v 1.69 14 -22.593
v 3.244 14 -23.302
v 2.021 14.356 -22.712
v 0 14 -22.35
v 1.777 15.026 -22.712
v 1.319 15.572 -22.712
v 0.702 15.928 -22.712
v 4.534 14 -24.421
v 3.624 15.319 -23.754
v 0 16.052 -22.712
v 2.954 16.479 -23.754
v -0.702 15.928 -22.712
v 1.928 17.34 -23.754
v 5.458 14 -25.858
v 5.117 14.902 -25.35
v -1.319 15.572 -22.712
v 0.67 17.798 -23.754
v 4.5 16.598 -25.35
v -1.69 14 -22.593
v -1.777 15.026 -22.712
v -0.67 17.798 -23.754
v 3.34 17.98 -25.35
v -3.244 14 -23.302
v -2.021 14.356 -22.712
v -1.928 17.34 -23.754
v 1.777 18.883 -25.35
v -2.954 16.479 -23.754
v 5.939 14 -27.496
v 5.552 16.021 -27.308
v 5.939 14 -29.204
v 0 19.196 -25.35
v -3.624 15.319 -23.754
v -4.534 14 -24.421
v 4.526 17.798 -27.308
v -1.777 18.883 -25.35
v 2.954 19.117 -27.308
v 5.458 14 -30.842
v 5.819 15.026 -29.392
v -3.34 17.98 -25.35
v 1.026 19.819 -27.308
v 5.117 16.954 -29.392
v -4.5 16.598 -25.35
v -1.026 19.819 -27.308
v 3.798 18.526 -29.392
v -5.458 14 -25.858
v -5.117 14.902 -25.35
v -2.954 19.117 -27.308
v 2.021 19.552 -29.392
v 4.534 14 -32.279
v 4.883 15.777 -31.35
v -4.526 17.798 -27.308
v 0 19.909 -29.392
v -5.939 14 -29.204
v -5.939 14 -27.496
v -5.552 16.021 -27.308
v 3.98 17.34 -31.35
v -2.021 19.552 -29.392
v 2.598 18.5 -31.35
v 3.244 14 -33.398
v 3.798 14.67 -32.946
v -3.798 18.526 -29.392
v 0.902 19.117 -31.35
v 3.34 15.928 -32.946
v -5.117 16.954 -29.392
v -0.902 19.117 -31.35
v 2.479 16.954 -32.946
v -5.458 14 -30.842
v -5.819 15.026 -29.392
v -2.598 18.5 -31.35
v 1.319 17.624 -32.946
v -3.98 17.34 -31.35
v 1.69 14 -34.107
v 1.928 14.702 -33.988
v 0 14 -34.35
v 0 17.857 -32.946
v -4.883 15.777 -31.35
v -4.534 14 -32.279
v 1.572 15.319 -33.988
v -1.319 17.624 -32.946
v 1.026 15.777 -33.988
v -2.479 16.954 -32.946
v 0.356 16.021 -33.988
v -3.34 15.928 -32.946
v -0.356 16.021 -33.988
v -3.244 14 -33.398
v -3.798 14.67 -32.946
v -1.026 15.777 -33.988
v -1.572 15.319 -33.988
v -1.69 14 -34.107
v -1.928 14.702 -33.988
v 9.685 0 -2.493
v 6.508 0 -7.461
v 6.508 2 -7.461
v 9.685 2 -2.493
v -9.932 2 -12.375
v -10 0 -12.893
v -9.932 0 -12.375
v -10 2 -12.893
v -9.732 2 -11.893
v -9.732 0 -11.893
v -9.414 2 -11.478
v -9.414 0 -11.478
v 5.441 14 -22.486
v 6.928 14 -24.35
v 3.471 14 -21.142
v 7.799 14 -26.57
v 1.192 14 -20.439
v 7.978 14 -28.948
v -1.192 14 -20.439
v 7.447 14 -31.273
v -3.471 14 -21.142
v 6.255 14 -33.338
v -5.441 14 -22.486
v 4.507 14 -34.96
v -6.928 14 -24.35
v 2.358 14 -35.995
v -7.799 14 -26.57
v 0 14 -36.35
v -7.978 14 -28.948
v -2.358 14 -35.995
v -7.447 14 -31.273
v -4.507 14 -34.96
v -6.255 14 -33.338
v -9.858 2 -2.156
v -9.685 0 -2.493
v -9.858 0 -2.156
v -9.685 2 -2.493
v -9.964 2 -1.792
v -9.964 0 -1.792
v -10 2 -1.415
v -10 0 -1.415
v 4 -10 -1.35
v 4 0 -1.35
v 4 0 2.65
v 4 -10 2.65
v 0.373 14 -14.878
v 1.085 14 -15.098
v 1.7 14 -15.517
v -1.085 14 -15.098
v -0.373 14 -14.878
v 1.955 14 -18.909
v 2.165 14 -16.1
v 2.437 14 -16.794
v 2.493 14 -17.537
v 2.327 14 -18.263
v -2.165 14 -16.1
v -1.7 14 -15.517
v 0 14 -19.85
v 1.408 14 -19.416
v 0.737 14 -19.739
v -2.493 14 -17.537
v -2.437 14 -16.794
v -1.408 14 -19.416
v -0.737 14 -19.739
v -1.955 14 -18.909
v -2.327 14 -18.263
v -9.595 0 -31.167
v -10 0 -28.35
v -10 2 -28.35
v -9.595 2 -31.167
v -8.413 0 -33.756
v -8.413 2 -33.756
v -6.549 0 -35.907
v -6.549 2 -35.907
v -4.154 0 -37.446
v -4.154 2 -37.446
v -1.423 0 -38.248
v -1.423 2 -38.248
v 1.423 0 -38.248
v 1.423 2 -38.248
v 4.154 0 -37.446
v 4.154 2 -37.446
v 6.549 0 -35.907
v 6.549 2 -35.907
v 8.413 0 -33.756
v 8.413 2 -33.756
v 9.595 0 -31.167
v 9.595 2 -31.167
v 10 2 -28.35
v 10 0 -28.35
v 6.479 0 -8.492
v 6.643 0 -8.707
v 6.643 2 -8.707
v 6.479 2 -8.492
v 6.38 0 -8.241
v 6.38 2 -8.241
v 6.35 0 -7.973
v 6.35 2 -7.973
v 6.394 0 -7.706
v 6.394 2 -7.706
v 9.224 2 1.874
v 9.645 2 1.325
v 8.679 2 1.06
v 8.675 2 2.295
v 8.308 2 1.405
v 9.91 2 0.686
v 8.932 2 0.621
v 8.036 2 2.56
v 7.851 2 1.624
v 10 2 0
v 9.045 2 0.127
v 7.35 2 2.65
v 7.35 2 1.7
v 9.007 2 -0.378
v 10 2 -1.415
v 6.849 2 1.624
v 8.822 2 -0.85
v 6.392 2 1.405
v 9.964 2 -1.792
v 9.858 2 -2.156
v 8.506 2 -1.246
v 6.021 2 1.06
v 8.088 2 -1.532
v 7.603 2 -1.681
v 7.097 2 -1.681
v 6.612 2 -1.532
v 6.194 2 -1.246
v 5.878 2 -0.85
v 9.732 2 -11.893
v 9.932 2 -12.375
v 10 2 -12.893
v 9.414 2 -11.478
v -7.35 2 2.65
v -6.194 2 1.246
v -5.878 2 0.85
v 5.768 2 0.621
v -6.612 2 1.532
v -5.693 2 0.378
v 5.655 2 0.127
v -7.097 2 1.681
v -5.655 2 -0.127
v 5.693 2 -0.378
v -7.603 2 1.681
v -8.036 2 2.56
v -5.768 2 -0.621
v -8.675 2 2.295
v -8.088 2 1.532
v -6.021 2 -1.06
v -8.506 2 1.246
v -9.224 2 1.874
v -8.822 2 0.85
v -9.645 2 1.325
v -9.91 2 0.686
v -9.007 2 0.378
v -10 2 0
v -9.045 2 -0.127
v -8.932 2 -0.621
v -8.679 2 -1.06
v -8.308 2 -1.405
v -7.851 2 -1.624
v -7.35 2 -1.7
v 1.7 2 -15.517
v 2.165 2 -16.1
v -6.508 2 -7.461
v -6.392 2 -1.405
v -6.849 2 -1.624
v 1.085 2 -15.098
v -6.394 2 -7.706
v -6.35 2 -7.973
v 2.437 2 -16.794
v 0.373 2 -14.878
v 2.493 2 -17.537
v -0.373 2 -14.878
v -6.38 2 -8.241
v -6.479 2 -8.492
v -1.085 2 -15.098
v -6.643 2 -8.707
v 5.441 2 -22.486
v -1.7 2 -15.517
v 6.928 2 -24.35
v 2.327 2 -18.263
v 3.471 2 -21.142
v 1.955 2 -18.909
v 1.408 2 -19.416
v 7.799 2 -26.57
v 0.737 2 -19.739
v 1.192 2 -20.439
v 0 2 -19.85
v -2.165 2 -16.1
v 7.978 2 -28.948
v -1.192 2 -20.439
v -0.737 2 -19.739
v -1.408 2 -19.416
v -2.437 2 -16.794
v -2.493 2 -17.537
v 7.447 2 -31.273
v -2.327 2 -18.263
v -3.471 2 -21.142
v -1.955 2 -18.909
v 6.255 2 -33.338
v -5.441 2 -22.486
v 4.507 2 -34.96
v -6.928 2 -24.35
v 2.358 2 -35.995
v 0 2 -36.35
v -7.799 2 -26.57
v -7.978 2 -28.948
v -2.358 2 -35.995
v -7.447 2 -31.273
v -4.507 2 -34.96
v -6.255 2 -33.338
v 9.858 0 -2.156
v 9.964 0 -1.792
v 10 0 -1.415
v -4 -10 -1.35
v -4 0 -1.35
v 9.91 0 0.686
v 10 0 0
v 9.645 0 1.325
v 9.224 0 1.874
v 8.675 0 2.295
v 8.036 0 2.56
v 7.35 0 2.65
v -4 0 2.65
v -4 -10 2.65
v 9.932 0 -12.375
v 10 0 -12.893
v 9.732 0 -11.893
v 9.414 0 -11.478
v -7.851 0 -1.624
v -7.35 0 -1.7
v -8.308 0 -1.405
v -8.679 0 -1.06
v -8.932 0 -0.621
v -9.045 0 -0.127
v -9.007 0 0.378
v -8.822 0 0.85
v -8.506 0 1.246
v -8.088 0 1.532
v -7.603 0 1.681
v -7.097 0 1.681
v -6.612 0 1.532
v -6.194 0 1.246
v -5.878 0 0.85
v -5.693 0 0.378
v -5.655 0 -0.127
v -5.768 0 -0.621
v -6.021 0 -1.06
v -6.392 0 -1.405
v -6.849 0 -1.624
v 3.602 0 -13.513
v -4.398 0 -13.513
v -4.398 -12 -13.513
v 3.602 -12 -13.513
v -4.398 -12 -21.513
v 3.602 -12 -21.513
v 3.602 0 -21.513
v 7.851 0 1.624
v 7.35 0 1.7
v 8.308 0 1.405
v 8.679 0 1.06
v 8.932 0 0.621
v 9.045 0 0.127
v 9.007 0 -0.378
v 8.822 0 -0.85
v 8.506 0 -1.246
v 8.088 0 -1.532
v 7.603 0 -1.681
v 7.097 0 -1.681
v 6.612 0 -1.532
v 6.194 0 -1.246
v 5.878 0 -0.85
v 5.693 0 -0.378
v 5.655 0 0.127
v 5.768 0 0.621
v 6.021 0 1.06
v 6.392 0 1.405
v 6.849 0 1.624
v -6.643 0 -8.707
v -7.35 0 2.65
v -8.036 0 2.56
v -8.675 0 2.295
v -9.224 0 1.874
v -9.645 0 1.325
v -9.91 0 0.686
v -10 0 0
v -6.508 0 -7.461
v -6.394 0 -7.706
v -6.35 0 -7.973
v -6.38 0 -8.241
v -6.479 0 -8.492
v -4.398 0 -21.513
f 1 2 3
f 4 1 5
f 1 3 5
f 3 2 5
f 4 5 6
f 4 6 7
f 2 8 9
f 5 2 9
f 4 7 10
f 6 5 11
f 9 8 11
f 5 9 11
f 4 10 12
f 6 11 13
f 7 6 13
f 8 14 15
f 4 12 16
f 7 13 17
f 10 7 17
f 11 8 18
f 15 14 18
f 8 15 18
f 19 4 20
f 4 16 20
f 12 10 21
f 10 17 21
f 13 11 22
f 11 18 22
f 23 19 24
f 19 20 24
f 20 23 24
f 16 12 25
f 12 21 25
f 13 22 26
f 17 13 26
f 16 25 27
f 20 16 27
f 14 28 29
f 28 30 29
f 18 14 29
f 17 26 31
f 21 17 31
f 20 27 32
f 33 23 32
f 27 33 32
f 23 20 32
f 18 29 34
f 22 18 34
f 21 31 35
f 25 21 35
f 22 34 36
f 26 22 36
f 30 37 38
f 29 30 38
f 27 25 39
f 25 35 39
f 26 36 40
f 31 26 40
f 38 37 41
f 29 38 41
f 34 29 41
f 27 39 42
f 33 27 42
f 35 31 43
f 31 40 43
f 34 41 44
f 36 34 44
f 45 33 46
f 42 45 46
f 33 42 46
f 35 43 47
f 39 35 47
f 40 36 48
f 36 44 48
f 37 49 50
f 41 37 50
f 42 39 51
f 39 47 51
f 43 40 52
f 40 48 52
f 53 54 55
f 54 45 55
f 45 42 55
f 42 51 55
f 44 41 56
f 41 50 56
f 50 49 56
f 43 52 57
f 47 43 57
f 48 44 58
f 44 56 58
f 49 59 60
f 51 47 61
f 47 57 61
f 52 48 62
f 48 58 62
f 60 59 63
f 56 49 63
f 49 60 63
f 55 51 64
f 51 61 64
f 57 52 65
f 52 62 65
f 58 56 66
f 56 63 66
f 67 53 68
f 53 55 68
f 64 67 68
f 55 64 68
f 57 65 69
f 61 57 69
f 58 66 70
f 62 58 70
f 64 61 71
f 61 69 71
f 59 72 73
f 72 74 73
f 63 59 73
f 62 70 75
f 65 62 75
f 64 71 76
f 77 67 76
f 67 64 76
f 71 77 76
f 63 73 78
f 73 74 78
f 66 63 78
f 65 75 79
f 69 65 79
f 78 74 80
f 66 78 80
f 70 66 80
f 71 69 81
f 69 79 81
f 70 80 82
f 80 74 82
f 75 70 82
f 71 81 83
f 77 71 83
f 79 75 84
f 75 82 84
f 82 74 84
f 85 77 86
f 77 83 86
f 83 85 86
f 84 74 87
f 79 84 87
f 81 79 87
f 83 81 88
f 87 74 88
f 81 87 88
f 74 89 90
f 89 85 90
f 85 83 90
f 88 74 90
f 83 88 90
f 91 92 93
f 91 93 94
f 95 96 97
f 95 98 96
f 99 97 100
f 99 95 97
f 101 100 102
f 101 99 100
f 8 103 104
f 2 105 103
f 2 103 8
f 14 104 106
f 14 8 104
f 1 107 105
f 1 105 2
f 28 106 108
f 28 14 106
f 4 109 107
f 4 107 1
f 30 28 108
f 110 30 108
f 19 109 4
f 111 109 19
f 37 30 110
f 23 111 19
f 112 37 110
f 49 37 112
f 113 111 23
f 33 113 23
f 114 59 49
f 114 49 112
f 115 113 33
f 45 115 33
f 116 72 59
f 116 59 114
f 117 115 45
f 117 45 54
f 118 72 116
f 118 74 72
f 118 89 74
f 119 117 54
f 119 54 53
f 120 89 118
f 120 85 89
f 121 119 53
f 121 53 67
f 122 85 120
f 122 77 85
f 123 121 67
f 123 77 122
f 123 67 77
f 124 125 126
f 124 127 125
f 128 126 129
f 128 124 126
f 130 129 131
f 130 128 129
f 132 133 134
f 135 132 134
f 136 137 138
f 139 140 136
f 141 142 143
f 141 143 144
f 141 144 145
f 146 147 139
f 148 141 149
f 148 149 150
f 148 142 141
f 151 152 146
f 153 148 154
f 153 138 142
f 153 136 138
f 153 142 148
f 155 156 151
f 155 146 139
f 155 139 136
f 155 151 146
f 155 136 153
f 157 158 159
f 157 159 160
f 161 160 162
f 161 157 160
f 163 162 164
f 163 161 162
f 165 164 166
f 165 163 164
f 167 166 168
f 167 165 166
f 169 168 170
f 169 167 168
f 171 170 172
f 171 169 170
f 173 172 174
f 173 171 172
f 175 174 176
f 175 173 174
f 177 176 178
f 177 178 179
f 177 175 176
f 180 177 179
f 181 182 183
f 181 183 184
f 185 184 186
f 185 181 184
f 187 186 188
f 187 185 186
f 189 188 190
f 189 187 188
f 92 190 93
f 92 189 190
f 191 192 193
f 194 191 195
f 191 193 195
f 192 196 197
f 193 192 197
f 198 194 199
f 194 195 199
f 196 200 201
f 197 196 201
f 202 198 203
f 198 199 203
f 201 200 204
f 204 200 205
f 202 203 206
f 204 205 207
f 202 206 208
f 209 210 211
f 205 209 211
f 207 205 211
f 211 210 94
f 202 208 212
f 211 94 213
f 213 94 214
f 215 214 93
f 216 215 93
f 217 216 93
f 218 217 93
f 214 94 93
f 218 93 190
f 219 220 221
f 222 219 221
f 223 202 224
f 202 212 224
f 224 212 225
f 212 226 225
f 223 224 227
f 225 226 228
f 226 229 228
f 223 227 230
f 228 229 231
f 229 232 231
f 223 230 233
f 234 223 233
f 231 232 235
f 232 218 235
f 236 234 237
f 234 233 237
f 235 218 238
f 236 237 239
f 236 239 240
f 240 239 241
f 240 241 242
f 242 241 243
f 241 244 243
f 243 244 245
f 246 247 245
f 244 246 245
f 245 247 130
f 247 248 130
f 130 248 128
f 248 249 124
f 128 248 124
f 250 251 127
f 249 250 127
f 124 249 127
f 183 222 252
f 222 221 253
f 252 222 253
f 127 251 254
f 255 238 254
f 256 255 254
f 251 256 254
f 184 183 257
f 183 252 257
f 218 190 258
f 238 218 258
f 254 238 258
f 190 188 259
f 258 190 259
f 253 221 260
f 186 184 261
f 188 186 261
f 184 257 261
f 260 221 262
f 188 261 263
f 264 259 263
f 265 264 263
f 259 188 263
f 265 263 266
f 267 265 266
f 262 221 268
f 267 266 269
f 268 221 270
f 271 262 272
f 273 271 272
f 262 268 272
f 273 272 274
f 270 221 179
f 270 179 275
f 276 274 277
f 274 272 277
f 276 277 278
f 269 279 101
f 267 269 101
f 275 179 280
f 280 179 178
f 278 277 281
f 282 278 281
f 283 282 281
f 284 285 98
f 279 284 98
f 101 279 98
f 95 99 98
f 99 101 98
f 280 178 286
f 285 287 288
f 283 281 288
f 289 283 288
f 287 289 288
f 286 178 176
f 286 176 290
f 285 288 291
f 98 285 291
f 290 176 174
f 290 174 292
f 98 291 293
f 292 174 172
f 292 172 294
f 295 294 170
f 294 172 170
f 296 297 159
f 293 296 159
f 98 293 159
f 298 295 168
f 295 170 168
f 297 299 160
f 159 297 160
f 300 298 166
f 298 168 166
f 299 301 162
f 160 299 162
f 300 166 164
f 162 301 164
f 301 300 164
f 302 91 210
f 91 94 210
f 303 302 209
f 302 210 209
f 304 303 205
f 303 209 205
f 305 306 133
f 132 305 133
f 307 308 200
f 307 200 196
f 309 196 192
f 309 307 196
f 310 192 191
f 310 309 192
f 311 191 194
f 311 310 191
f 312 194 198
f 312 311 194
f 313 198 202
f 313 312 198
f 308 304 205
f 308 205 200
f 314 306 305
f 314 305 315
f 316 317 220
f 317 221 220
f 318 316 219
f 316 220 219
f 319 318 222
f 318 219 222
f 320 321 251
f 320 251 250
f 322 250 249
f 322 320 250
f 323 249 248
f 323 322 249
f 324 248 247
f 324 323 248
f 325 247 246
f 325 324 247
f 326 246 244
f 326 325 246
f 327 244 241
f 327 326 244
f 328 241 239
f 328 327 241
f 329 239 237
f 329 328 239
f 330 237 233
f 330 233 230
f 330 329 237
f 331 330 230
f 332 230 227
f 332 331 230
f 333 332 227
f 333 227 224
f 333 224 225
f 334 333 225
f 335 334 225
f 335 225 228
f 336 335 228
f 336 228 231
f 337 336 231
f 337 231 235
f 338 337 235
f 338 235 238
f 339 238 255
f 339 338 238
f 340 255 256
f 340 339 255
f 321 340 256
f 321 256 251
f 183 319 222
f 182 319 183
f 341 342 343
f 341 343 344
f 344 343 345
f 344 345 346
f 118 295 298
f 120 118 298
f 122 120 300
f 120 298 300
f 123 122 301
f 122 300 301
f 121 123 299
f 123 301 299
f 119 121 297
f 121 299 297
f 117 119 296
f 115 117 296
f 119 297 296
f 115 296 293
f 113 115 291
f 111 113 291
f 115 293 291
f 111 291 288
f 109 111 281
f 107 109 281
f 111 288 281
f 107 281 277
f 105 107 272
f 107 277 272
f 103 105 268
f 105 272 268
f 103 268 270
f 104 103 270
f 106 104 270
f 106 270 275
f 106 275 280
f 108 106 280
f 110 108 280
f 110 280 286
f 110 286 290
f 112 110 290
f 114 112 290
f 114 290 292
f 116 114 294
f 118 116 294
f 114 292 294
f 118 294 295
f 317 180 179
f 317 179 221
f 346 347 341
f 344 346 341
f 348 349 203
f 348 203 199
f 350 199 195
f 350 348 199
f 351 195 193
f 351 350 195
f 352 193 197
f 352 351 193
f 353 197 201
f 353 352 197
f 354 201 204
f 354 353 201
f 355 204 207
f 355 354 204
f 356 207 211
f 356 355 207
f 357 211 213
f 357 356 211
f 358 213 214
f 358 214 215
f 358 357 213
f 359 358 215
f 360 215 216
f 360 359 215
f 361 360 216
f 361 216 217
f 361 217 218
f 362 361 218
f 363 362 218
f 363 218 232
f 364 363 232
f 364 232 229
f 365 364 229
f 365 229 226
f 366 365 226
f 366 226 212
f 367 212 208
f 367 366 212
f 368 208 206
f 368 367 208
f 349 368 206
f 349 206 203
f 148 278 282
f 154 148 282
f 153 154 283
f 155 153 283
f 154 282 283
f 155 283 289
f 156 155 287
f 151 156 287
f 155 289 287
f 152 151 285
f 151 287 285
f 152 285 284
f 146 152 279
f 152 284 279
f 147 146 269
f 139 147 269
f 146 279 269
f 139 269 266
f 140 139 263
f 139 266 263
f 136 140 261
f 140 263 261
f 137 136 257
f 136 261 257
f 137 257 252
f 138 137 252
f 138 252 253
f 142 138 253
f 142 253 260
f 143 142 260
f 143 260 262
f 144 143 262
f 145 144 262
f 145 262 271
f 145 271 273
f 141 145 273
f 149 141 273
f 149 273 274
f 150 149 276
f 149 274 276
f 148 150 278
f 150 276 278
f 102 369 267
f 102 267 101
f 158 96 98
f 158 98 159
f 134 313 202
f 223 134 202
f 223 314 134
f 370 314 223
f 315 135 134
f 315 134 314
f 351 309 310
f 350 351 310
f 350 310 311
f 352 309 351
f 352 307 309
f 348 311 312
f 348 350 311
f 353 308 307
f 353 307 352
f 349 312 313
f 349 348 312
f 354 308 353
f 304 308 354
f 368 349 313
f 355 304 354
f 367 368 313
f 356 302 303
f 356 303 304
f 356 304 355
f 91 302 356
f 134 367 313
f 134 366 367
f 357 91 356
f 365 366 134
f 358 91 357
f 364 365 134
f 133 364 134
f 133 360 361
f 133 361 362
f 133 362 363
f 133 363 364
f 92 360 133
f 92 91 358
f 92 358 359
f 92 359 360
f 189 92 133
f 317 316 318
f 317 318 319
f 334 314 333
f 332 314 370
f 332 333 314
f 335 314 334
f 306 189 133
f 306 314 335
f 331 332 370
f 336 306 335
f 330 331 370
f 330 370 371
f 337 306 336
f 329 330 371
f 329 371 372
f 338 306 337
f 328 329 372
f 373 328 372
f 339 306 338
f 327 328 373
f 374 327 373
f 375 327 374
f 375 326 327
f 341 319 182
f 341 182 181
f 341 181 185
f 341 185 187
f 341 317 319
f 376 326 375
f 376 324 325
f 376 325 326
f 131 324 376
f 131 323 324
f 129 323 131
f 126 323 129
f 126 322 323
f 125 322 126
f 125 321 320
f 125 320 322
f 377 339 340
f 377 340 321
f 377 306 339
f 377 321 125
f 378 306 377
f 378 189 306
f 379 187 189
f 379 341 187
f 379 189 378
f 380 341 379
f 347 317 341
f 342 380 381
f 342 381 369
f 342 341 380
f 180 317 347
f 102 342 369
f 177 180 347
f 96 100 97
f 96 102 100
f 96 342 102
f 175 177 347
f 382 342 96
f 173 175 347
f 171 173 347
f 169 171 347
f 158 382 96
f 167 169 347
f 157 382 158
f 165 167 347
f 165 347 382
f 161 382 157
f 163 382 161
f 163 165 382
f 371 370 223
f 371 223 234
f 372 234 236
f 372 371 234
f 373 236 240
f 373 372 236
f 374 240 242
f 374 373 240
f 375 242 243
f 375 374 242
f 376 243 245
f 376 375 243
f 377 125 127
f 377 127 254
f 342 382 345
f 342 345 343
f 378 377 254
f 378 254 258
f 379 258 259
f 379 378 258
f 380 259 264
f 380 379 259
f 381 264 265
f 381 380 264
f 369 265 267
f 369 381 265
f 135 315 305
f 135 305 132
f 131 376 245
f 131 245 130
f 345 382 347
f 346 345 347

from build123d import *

# Parameters (mm, degrees)
SKETCH_1_R      = 1.7
EXTRUDE_1_DEPTH = 2
FILLET_1_R      = 2
SKETCH_3_R      = 8
SKETCH_3_R_2    = 2.5
EXTRUDE_2_DEPTH = 12
SKETCH_5_W      = 8
SKETCH_5_H      = 8
EXTRUDE_3_DEPTH = 12
SKETCH_6_W      = 8
SKETCH_6_H      = 4
EXTRUDE_4_DEPTH = 10


with BuildPart() as part:
    # 草图1 → 凸台-拉伸1 (new body)
    with BuildSketch(Plane(origin=(0, 0, 0), x_dir=(1, 0, 0), z_dir=(0, 1, 0))):
        with BuildLine():
            Line((10, 28.35), (10, 12.064213562))
            Line((10, 12.064213562), (6.642893219, 8.707106781))
            ThreePointArc((6.642893219, 8.707106781), (6.355850084, 8.108009006), (6.507537143, 7.461245571))
            Line((6.507537143, 7.461245571), (10, 2))
            Line((10, 2), (10, 0))
            ThreePointArc((10, 0), (9.22383297, -1.87383297), (7.35, -2.65))
            Line((7.35, -2.65), (-7.35, -2.65))
            ThreePointArc((-7.35, -2.65), (-9.22383297, -1.87383297), (-10, 0))
            Line((-10, 0), (-10, 2))
            Line((-10, 2), (-6.507537143, 7.461245571))
            ThreePointArc((-6.507537143, 7.461245571), (-6.355850084, 8.108009006), (-6.642893219, 8.707106781))
            Line((-6.642893219, 8.707106781), (-10, 12.064213562))
            Line((-10, 12.064213562), (-10, 28.35))
            ThreePointArc((-10, 28.35), (0, 38.35), (10, 28.35))
        make_face()
        with Locations(Location((7.35, 0, 0), (0, 0, 270))):
            Circle(SKETCH_1_R, mode=Mode.SUBTRACT)
        with Locations(Location((-7.35, 0, 0), (0, 0, 90))):
            Circle(SKETCH_1_R, mode=Mode.SUBTRACT)
    extrude(amount=EXTRUDE_1_DEPTH)

    # 圆角1
    fillet_1_edges = [part.edges().sort_by_distance(p)[0] for p in [
        (-10, 1, -2),
        (-10, 1, -12.064213562),
        (10, 1, -12.064213562),
        (10, 1, -2),
    ]]
    fillet(fillet_1_edges, radius=FILLET_1_R)

    # 草图3 → 凸台-拉伸2 (add)
    with BuildSketch(Plane(origin=(0, 2, 0), x_dir=(1, 0, 0), z_dir=(0, 1, 0))):
        with Locations(Location((0, 28.35, 0), (0, 0, 90))):
            Circle(SKETCH_3_R)
        with Locations(Location((0, 17.35, 0), (0, 0, 90))):
            Circle(SKETCH_3_R_2)
    extrude(amount=EXTRUDE_2_DEPTH)

    # 草图4 → 旋转1 (revolve)
    with BuildSketch(Plane(origin=(0, 14, 0), x_dir=(1, 0, 0), z_dir=(0, 1, 0))):
        with BuildLine():
            Line((0, 34.35), (0, 22.35))
            ThreePointArc((0, 22.35), (6, 28.35), (0, 34.35))
        make_face()
    revolve(axis=Axis((0, 14, -36.05355047), (0, 0, 1)))

    # 草图5 → 凸台-拉伸3 (add)
    with BuildSketch(Plane.XZ):
        with Locations((-0.398314742, -17.513469077)):
            Rectangle(SKETCH_5_W, SKETCH_5_H)
    extrude(amount=EXTRUDE_3_DEPTH)

    # 草图6 → 凸台-拉伸4 (add)
    with BuildSketch(Plane.XZ):
        with Locations((0, 0.65)):
            Rectangle(SKETCH_6_W, SKETCH_6_H)
    extrude(amount=EXTRUDE_4_DEPTH)


solid = part.part
